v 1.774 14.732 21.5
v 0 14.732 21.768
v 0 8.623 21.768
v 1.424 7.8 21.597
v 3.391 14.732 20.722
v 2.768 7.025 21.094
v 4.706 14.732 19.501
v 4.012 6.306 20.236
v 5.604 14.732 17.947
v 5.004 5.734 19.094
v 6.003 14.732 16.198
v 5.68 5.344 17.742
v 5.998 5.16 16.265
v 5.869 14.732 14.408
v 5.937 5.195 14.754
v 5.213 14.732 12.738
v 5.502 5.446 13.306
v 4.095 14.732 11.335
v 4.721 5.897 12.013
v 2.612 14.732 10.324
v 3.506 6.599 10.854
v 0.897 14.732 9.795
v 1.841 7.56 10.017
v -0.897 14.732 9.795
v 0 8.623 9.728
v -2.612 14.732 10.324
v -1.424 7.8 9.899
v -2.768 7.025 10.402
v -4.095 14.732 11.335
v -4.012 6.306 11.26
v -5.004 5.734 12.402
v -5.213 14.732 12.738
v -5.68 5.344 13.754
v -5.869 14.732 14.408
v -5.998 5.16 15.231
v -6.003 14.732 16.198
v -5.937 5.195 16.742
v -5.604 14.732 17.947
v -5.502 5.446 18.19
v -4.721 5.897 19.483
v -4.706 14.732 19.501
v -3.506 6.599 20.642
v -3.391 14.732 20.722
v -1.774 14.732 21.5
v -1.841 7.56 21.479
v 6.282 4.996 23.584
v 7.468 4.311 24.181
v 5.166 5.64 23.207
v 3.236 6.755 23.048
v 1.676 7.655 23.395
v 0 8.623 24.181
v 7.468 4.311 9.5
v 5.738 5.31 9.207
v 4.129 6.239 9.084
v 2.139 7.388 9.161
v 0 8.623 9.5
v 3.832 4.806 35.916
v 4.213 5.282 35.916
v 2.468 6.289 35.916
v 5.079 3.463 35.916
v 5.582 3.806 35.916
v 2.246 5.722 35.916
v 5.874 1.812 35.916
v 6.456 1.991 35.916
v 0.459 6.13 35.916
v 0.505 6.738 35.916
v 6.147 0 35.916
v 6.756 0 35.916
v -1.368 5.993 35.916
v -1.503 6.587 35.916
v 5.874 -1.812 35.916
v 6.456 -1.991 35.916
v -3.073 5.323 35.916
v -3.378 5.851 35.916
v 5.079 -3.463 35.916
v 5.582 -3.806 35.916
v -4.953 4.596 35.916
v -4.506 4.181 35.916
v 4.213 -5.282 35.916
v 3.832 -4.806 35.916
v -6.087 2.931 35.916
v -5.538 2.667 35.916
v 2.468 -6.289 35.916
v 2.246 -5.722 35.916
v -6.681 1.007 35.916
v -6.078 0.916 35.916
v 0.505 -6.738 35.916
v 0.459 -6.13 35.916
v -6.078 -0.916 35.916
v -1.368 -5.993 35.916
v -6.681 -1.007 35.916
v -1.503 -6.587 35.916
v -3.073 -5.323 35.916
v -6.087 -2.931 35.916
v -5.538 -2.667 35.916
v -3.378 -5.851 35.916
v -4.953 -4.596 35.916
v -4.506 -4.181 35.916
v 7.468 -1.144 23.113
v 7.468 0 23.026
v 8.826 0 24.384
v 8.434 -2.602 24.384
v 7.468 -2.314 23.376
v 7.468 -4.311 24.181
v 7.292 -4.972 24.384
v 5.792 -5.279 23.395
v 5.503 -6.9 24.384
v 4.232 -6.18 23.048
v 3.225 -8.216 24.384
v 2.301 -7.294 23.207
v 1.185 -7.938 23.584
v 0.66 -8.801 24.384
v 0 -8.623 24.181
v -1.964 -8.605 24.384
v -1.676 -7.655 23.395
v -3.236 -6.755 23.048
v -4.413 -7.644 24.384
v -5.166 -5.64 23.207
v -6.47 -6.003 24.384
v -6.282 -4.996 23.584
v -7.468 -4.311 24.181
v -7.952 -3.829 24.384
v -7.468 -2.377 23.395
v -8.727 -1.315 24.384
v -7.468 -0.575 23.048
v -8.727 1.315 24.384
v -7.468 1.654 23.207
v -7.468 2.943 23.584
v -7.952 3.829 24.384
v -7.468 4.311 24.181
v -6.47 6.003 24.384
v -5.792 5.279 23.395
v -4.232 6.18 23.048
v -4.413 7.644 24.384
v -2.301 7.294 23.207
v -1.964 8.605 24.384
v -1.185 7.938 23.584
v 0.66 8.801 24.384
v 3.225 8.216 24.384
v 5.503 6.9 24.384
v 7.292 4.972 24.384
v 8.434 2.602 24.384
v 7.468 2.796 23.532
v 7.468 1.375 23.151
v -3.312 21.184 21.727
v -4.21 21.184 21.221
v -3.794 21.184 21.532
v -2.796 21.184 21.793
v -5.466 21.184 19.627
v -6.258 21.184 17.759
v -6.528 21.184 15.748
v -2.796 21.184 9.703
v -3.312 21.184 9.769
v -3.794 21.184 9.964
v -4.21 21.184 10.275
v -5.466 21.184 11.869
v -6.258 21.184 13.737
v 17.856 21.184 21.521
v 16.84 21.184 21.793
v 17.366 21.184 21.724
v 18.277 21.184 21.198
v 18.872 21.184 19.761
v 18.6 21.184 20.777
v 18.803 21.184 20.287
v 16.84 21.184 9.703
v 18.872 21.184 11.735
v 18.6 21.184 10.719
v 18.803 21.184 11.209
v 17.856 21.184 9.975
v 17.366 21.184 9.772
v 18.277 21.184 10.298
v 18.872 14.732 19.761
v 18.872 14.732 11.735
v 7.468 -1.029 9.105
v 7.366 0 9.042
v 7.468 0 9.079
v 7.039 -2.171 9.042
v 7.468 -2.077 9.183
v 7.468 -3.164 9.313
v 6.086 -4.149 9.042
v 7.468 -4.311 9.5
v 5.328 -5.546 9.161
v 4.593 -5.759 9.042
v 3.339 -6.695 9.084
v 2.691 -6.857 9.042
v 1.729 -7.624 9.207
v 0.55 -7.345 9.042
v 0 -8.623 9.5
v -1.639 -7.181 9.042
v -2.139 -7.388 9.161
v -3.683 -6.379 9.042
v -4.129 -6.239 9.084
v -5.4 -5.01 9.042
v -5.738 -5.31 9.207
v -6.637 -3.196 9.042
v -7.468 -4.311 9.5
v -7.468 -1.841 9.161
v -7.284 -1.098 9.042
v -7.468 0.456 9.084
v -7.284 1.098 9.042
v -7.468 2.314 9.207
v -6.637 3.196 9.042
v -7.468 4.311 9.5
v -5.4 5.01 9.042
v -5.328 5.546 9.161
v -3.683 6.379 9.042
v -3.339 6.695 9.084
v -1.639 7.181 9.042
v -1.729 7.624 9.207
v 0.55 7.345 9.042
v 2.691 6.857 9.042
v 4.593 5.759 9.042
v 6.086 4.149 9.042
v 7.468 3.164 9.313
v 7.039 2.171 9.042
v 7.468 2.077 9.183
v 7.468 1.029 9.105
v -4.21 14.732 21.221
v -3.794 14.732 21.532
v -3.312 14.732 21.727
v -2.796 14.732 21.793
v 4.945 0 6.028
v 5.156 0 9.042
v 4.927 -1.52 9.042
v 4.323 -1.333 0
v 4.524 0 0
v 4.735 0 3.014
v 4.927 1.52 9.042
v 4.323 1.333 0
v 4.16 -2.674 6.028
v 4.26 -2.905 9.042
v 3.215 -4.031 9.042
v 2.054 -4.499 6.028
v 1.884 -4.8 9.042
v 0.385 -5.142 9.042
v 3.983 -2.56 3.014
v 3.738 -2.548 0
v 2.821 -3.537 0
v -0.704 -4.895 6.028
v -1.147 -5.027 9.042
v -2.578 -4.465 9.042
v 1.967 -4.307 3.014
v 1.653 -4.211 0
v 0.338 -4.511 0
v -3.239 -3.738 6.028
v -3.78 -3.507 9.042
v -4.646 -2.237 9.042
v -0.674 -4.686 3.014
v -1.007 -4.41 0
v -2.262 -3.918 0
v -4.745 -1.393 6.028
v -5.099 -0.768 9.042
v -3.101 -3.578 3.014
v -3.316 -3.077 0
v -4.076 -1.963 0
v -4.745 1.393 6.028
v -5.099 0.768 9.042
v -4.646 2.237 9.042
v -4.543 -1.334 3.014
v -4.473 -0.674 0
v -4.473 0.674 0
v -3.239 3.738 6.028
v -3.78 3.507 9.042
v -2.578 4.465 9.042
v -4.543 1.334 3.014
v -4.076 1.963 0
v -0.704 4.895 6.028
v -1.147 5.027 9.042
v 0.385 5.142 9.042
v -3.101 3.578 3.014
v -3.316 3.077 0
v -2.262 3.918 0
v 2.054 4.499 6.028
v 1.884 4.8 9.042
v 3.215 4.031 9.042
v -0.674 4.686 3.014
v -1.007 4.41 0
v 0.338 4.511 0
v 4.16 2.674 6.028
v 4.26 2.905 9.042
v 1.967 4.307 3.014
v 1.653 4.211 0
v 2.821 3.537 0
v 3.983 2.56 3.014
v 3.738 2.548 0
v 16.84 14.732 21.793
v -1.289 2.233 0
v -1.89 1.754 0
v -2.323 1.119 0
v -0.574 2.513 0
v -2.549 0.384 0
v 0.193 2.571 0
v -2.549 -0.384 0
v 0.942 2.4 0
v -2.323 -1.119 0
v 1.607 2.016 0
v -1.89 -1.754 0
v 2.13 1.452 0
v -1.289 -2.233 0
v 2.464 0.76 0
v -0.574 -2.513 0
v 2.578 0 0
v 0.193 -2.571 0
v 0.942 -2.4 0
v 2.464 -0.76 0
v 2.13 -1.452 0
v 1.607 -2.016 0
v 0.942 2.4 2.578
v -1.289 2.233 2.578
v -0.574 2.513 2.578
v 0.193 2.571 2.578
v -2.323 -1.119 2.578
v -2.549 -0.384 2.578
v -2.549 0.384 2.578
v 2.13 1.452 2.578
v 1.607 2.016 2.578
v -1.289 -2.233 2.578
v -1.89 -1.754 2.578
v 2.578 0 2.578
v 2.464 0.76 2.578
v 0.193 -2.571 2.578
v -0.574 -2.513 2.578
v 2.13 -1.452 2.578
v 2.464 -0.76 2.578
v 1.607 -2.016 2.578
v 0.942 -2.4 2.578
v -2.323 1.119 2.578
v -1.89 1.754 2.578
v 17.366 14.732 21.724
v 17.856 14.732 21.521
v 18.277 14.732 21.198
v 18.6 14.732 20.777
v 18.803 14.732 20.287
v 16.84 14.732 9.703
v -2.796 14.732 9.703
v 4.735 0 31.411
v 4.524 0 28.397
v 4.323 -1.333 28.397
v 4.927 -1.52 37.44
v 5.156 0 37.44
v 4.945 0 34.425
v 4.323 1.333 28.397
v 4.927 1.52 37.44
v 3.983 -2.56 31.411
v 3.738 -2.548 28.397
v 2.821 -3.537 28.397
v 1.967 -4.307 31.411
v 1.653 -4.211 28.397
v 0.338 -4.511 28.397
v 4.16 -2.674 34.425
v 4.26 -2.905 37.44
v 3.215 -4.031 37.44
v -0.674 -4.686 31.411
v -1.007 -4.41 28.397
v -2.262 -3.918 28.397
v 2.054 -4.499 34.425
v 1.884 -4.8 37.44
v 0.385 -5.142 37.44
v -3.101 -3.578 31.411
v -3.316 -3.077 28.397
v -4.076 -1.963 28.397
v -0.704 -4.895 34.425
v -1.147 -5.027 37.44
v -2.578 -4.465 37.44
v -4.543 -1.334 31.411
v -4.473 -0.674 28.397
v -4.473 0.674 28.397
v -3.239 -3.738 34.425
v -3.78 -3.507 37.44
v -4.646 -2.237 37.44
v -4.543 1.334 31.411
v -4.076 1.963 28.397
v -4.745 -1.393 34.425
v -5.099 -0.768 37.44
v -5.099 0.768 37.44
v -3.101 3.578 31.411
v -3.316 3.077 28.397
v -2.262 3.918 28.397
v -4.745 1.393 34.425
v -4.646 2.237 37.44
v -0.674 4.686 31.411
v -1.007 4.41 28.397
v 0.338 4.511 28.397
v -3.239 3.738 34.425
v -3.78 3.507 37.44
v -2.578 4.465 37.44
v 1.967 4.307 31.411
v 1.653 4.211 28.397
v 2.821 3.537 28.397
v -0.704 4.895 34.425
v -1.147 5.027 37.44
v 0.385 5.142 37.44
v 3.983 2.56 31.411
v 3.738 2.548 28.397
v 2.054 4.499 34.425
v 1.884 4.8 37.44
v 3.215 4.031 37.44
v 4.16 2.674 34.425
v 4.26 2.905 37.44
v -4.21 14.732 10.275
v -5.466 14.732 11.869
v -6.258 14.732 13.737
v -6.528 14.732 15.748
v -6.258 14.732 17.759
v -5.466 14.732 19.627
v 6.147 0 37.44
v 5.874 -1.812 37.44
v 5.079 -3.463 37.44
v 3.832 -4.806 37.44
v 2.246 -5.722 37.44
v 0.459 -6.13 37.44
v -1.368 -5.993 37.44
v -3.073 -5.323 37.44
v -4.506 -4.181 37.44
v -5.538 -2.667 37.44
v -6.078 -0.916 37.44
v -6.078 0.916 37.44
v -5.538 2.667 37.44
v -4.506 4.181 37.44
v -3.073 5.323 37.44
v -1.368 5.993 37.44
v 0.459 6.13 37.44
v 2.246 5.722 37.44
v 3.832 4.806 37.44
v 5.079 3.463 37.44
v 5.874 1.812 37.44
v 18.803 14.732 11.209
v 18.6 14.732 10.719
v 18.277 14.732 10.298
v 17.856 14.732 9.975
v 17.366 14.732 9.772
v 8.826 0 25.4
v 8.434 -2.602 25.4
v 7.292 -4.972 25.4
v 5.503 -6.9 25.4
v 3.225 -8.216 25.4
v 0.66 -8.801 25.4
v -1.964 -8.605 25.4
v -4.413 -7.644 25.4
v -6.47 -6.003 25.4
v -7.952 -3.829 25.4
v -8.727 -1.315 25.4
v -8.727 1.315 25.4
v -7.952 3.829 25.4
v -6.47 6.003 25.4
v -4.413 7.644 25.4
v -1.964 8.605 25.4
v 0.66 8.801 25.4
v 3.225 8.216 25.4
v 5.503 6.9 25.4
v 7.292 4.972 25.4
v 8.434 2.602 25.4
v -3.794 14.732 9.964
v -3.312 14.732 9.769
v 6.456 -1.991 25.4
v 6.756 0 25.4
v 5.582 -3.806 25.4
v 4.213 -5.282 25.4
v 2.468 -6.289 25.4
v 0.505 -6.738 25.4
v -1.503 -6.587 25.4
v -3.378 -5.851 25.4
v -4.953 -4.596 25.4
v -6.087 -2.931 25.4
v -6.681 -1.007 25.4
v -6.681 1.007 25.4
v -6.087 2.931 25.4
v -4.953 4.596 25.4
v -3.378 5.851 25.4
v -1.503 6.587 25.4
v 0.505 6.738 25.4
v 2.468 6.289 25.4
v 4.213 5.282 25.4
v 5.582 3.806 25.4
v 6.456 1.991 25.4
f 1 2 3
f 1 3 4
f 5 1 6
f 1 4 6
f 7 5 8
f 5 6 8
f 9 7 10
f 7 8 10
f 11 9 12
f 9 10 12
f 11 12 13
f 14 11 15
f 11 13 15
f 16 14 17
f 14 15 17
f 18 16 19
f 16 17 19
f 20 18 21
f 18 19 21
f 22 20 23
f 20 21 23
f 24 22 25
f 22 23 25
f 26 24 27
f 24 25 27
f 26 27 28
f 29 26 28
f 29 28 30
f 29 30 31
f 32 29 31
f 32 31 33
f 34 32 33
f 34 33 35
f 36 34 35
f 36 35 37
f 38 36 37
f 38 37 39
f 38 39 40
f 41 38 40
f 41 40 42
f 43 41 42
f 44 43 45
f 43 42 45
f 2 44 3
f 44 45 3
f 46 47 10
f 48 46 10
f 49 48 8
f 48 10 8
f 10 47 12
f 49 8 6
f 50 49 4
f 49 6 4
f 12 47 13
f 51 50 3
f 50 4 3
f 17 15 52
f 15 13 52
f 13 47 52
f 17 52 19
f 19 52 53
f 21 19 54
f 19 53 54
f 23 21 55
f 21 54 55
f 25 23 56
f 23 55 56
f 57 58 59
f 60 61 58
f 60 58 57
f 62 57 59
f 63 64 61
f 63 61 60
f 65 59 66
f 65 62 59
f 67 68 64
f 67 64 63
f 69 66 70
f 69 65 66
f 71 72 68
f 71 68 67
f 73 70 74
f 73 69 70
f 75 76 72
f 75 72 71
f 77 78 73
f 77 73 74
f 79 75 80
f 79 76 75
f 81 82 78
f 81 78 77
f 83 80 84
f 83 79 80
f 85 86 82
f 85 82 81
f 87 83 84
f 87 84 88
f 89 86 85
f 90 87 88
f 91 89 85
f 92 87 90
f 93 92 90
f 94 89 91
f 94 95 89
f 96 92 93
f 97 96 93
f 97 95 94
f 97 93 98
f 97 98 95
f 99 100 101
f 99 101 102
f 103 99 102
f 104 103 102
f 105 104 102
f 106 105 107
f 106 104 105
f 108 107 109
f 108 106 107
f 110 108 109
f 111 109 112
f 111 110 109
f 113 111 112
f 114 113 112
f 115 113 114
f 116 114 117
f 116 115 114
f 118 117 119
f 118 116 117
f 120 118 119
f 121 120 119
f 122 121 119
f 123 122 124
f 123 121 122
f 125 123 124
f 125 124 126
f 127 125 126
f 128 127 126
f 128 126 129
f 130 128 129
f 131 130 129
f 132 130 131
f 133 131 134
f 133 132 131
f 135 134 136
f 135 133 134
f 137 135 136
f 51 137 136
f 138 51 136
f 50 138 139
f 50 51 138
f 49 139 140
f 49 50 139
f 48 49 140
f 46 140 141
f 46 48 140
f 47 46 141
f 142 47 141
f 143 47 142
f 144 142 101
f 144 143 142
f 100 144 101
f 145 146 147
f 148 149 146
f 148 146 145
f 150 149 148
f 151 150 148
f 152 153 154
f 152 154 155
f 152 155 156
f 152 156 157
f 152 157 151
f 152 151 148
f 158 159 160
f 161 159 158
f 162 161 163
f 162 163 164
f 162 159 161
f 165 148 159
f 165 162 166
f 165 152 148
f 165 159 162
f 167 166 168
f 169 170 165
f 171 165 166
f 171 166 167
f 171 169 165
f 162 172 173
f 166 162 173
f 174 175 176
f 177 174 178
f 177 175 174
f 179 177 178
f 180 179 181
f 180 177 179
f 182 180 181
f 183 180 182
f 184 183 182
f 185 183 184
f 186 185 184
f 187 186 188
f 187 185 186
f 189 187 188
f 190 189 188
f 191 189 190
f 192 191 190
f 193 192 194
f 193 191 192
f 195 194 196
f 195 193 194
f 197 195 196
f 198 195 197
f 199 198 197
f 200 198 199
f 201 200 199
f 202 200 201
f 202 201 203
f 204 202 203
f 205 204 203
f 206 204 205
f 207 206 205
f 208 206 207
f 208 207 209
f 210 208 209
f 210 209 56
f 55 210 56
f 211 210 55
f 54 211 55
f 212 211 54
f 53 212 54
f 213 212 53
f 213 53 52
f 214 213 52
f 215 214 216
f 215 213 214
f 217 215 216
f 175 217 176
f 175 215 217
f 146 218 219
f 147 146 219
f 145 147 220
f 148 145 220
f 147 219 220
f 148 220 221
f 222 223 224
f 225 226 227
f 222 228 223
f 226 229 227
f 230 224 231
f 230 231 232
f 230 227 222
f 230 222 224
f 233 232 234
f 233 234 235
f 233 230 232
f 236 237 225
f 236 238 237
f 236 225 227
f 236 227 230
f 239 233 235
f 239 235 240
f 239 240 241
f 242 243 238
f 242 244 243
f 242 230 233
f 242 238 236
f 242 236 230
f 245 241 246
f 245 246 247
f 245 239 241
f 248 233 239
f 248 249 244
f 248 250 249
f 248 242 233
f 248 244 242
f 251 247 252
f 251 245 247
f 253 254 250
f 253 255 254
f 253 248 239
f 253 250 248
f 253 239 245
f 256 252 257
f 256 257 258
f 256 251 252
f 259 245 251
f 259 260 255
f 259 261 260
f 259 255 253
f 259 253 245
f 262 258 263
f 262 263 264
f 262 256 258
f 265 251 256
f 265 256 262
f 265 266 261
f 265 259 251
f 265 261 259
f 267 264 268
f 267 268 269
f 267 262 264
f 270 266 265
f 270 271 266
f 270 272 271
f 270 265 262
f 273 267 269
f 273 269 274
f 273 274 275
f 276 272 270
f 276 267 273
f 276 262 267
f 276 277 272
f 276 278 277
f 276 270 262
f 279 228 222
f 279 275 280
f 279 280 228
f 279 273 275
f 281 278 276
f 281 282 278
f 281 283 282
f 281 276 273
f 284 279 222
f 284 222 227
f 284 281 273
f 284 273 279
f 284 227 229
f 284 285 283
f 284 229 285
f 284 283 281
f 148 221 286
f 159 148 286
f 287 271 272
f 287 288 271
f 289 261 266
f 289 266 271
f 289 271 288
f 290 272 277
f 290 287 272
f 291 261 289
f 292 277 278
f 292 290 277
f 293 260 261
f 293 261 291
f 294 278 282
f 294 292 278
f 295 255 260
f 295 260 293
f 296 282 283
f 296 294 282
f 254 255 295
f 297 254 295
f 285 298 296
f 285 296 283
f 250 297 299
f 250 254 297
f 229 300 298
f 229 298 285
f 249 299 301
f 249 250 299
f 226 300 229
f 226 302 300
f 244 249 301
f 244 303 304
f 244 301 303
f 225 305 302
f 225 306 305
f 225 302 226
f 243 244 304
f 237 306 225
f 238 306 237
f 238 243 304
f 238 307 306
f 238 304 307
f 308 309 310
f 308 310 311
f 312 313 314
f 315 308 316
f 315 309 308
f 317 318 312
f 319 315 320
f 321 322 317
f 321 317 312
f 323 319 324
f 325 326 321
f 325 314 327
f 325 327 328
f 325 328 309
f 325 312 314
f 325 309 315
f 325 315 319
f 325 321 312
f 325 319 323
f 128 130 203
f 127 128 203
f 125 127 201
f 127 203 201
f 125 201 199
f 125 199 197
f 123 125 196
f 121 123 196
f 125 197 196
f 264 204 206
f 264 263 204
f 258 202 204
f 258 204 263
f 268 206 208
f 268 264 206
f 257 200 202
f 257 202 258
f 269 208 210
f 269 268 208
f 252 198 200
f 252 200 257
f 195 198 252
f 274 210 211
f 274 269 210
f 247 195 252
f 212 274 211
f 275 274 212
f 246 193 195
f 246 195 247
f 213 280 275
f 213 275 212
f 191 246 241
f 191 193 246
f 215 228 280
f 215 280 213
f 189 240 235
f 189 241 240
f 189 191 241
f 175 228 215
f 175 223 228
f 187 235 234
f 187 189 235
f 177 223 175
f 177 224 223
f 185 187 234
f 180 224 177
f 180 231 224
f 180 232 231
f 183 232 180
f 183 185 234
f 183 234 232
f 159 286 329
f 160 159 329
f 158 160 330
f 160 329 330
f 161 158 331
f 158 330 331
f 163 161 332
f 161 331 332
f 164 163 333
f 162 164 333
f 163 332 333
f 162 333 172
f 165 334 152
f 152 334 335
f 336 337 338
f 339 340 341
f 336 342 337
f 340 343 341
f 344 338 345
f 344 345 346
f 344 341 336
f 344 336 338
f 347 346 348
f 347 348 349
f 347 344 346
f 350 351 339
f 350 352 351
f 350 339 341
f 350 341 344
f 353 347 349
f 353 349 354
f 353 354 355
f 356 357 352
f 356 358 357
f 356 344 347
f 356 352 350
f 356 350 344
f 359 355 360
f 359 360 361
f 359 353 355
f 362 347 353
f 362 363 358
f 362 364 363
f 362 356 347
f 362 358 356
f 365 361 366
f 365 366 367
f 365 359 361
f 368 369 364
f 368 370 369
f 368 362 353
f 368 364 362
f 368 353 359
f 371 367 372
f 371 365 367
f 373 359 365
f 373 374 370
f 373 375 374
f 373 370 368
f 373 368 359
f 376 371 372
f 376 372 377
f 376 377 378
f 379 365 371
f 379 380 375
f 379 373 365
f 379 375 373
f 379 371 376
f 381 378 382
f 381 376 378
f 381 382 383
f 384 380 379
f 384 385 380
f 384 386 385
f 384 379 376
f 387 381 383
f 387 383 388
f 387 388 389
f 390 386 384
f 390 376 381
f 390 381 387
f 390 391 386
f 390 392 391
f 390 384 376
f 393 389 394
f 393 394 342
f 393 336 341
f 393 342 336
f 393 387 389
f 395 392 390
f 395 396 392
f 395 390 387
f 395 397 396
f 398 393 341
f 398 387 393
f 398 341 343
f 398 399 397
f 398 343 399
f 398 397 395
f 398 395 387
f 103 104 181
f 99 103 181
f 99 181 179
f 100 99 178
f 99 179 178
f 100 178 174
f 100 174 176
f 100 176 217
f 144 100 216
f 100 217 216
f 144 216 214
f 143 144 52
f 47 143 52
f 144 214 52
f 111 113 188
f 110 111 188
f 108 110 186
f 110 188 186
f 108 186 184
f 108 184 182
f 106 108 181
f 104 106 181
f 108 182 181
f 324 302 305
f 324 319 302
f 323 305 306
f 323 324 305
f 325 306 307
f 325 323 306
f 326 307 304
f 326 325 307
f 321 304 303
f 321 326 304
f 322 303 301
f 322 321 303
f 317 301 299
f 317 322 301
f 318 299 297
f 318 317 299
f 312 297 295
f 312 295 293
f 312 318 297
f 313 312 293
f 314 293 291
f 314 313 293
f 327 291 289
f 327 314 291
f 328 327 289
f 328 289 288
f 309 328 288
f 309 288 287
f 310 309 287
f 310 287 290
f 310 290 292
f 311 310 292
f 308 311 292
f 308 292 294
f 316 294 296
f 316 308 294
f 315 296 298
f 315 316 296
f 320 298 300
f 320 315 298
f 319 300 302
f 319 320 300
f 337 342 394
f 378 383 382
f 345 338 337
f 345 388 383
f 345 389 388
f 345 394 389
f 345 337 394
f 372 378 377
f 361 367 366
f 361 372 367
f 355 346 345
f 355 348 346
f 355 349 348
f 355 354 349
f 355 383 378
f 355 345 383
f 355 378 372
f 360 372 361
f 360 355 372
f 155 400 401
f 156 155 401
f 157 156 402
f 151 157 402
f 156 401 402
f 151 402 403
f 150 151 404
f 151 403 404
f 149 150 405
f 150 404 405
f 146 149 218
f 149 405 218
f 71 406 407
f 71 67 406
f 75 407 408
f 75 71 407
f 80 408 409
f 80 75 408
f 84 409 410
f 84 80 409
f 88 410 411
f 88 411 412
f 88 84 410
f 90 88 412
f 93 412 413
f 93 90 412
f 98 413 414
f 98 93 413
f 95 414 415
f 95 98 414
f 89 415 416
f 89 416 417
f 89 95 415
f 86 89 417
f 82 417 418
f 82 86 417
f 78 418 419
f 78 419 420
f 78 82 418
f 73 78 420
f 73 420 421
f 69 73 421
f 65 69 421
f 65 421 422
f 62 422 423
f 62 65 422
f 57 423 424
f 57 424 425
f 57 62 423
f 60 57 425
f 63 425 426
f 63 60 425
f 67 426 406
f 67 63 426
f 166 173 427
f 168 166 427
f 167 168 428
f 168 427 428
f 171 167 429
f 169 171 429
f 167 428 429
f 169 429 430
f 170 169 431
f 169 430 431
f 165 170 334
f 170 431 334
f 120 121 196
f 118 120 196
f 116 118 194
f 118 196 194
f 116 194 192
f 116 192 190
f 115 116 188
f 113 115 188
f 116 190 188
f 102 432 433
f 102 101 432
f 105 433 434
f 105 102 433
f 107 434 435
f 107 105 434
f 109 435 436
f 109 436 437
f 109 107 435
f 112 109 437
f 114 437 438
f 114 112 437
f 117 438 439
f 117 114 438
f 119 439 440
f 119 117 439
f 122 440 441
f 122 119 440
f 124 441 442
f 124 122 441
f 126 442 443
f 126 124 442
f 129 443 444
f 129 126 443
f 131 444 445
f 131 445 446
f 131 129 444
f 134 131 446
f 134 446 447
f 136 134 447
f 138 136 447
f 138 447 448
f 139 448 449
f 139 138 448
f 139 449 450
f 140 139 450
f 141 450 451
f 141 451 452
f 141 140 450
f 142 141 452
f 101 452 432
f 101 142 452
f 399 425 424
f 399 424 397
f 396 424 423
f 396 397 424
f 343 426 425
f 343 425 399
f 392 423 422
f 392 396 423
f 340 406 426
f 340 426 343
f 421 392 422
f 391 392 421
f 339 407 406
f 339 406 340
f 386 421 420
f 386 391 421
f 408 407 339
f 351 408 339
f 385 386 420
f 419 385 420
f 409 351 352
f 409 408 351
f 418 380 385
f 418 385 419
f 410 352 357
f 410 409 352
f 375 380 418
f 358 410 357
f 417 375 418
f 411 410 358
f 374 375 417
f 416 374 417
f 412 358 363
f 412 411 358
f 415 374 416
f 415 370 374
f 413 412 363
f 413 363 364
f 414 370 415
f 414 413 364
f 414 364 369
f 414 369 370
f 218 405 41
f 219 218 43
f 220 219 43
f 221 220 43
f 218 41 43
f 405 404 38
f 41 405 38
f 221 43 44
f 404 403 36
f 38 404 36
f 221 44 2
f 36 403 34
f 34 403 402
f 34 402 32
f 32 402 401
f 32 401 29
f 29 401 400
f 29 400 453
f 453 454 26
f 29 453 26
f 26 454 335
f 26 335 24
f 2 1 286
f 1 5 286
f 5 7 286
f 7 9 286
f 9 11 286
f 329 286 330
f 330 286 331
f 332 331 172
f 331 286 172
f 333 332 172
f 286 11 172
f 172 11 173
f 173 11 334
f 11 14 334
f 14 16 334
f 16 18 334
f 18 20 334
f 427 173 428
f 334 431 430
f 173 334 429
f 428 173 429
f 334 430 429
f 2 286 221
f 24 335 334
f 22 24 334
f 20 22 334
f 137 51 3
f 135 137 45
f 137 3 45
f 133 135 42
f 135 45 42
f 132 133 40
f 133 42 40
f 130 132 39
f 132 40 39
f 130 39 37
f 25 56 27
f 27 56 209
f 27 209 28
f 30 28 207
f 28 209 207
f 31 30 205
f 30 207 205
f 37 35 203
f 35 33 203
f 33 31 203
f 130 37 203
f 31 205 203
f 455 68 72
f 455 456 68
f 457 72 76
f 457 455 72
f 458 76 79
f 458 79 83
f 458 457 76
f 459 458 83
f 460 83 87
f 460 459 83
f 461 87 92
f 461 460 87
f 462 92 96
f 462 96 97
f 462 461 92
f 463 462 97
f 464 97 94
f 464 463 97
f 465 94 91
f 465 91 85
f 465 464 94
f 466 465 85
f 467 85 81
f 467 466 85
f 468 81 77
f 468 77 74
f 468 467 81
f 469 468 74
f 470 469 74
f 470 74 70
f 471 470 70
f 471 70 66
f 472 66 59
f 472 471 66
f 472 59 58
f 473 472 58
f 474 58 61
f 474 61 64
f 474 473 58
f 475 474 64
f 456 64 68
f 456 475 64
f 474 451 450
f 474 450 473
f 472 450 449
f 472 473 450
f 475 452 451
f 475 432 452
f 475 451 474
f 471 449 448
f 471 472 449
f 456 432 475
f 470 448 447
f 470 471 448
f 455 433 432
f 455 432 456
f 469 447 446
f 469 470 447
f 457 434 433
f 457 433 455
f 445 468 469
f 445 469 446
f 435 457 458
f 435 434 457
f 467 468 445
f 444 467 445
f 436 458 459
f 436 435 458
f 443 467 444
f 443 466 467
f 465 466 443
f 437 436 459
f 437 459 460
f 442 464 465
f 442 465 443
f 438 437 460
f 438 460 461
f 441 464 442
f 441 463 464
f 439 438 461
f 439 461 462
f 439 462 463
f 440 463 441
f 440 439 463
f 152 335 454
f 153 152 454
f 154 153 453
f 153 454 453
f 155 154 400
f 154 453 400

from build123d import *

# Parameters (mm, degrees)
BOSS_EXTRUDE1_DEPTH = 45.72
SKETCH5_R           = 6.0198
BOSS_EXTRUDE3_DEPTH = 14.732
BOSS_EXTRUDE4_DEPTH = 6.4516


with BuildPart() as part:
    # Sketch2 → Boss-Extrude1 (new body)
    with BuildSketch(Plane.XY):
        Polygon((0, 8.62284174), (-7.4676, 4.31142087), (-7.4676, -4.31142087), (0, -8.62284174), (7.4676, -4.31142087), (7.4676, 4.31142087), align=None)
    extrude(amount=BOSS_EXTRUDE1_DEPTH)

    # Sketch1 → Cut-Revolve1 (revolve, cut)
    with BuildSketch(Plane(origin=(0, 0, 0), x_dir=(0, 0, -1), z_dir=(1, 0, 0)), mode=Mode.PRIVATE) as cut_revolve1_sk:
        Polygon((8.722264365, 0), (8.722264365, 28.967330829), (-61.313897387, 28.967330829), (-61.313897387, 0), (-28.3972, 0), (-28.3972, 4.523893796), (-37.4396, 5.1562), (-37.4396, 6.1468), (-35.9156, 6.1468), (-35.9156, 6.7564), (-25.4, 6.7564), (-25.4, 17.888200709), (-12.872167857, 17.888200709), (-9.0424, 7.366), (-9.0424, 5.1562), (0, 4.523893796), (0, 2.5781), (-2.5781, 2.5781), (-2.5781, 0), align=None)
    revolve(cut_revolve1_sk.sketch.rotate(Axis((0, 0, -8.722264365), (0, 0, -1)), 90), axis=Axis((0, 0, -8.722264365), (0, 0, -1)), mode=Mode.SUBTRACT)

    # Sketch4 → Revolve1 (revolve)
    with BuildSketch(Plane(origin=(0, 0, 0), x_dir=(0, 0, -1), z_dir=(1, 0, 0)), mode=Mode.PRIVATE) as revolve1_sk:
        Polygon((-25.4, 8.82604174), (-24.384, 8.82604174), (-19.479330617, 3.921372357), (-25.4, 3.921372357), align=None)
    revolve(revolve1_sk.sketch.rotate(Axis((0, 0, 13.232415159), (0, 0, -1)), 90), axis=Axis((0, 0, 13.232415159), (0, 0, -1)))

    # Sketch5 → Boss-Extrude3 (add)
    with BuildSketch(Plane(origin=(0, 0, 0), x_dir=(1, 0, 0), z_dir=(0, 1, 0))):
        with Locations(Location((0, -15.748, 0), (0, 0, 270))):
            Circle(SKETCH5_R)
    extrude(amount=BOSS_EXTRUDE3_DEPTH)

    # Sketch6 → Boss-Extrude4 (add)
    with BuildSketch(Plane(origin=(0, 14.732, 0), x_dir=(1, 0, 0), z_dir=(0, 1, 0))):
        with BuildLine():
            Line((-2.796240531, -21.7932), (16.8402, -21.7932))
            ThreePointArc((16.8402, -21.7932), (18.277040979, -21.198040979), (18.8722, -19.7612))
            Line((18.8722, -19.7612), (18.8722, -11.7348))
            ThreePointArc((18.8722, -11.7348), (18.277040979, -10.297959021), (16.8402, -9.7028))
            Line((16.8402, -9.7028), (-2.796240531, -9.7028))
            ThreePointArc((-2.796240531, -9.7028), (-3.559009839, -9.851396968), (-4.210218905, -10.275454545))
            ThreePointArc((-4.210218905, -10.275454545), (-6.5278, -15.748), (-4.210218905, -21.220545455))
            ThreePointArc((-4.210218905, -21.220545455), (-3.559009839, -21.644603032), (-2.796240531, -21.7932))
        make_face()
    extrude(amount=BOSS_EXTRUDE4_DEPTH)


solid = part.part
